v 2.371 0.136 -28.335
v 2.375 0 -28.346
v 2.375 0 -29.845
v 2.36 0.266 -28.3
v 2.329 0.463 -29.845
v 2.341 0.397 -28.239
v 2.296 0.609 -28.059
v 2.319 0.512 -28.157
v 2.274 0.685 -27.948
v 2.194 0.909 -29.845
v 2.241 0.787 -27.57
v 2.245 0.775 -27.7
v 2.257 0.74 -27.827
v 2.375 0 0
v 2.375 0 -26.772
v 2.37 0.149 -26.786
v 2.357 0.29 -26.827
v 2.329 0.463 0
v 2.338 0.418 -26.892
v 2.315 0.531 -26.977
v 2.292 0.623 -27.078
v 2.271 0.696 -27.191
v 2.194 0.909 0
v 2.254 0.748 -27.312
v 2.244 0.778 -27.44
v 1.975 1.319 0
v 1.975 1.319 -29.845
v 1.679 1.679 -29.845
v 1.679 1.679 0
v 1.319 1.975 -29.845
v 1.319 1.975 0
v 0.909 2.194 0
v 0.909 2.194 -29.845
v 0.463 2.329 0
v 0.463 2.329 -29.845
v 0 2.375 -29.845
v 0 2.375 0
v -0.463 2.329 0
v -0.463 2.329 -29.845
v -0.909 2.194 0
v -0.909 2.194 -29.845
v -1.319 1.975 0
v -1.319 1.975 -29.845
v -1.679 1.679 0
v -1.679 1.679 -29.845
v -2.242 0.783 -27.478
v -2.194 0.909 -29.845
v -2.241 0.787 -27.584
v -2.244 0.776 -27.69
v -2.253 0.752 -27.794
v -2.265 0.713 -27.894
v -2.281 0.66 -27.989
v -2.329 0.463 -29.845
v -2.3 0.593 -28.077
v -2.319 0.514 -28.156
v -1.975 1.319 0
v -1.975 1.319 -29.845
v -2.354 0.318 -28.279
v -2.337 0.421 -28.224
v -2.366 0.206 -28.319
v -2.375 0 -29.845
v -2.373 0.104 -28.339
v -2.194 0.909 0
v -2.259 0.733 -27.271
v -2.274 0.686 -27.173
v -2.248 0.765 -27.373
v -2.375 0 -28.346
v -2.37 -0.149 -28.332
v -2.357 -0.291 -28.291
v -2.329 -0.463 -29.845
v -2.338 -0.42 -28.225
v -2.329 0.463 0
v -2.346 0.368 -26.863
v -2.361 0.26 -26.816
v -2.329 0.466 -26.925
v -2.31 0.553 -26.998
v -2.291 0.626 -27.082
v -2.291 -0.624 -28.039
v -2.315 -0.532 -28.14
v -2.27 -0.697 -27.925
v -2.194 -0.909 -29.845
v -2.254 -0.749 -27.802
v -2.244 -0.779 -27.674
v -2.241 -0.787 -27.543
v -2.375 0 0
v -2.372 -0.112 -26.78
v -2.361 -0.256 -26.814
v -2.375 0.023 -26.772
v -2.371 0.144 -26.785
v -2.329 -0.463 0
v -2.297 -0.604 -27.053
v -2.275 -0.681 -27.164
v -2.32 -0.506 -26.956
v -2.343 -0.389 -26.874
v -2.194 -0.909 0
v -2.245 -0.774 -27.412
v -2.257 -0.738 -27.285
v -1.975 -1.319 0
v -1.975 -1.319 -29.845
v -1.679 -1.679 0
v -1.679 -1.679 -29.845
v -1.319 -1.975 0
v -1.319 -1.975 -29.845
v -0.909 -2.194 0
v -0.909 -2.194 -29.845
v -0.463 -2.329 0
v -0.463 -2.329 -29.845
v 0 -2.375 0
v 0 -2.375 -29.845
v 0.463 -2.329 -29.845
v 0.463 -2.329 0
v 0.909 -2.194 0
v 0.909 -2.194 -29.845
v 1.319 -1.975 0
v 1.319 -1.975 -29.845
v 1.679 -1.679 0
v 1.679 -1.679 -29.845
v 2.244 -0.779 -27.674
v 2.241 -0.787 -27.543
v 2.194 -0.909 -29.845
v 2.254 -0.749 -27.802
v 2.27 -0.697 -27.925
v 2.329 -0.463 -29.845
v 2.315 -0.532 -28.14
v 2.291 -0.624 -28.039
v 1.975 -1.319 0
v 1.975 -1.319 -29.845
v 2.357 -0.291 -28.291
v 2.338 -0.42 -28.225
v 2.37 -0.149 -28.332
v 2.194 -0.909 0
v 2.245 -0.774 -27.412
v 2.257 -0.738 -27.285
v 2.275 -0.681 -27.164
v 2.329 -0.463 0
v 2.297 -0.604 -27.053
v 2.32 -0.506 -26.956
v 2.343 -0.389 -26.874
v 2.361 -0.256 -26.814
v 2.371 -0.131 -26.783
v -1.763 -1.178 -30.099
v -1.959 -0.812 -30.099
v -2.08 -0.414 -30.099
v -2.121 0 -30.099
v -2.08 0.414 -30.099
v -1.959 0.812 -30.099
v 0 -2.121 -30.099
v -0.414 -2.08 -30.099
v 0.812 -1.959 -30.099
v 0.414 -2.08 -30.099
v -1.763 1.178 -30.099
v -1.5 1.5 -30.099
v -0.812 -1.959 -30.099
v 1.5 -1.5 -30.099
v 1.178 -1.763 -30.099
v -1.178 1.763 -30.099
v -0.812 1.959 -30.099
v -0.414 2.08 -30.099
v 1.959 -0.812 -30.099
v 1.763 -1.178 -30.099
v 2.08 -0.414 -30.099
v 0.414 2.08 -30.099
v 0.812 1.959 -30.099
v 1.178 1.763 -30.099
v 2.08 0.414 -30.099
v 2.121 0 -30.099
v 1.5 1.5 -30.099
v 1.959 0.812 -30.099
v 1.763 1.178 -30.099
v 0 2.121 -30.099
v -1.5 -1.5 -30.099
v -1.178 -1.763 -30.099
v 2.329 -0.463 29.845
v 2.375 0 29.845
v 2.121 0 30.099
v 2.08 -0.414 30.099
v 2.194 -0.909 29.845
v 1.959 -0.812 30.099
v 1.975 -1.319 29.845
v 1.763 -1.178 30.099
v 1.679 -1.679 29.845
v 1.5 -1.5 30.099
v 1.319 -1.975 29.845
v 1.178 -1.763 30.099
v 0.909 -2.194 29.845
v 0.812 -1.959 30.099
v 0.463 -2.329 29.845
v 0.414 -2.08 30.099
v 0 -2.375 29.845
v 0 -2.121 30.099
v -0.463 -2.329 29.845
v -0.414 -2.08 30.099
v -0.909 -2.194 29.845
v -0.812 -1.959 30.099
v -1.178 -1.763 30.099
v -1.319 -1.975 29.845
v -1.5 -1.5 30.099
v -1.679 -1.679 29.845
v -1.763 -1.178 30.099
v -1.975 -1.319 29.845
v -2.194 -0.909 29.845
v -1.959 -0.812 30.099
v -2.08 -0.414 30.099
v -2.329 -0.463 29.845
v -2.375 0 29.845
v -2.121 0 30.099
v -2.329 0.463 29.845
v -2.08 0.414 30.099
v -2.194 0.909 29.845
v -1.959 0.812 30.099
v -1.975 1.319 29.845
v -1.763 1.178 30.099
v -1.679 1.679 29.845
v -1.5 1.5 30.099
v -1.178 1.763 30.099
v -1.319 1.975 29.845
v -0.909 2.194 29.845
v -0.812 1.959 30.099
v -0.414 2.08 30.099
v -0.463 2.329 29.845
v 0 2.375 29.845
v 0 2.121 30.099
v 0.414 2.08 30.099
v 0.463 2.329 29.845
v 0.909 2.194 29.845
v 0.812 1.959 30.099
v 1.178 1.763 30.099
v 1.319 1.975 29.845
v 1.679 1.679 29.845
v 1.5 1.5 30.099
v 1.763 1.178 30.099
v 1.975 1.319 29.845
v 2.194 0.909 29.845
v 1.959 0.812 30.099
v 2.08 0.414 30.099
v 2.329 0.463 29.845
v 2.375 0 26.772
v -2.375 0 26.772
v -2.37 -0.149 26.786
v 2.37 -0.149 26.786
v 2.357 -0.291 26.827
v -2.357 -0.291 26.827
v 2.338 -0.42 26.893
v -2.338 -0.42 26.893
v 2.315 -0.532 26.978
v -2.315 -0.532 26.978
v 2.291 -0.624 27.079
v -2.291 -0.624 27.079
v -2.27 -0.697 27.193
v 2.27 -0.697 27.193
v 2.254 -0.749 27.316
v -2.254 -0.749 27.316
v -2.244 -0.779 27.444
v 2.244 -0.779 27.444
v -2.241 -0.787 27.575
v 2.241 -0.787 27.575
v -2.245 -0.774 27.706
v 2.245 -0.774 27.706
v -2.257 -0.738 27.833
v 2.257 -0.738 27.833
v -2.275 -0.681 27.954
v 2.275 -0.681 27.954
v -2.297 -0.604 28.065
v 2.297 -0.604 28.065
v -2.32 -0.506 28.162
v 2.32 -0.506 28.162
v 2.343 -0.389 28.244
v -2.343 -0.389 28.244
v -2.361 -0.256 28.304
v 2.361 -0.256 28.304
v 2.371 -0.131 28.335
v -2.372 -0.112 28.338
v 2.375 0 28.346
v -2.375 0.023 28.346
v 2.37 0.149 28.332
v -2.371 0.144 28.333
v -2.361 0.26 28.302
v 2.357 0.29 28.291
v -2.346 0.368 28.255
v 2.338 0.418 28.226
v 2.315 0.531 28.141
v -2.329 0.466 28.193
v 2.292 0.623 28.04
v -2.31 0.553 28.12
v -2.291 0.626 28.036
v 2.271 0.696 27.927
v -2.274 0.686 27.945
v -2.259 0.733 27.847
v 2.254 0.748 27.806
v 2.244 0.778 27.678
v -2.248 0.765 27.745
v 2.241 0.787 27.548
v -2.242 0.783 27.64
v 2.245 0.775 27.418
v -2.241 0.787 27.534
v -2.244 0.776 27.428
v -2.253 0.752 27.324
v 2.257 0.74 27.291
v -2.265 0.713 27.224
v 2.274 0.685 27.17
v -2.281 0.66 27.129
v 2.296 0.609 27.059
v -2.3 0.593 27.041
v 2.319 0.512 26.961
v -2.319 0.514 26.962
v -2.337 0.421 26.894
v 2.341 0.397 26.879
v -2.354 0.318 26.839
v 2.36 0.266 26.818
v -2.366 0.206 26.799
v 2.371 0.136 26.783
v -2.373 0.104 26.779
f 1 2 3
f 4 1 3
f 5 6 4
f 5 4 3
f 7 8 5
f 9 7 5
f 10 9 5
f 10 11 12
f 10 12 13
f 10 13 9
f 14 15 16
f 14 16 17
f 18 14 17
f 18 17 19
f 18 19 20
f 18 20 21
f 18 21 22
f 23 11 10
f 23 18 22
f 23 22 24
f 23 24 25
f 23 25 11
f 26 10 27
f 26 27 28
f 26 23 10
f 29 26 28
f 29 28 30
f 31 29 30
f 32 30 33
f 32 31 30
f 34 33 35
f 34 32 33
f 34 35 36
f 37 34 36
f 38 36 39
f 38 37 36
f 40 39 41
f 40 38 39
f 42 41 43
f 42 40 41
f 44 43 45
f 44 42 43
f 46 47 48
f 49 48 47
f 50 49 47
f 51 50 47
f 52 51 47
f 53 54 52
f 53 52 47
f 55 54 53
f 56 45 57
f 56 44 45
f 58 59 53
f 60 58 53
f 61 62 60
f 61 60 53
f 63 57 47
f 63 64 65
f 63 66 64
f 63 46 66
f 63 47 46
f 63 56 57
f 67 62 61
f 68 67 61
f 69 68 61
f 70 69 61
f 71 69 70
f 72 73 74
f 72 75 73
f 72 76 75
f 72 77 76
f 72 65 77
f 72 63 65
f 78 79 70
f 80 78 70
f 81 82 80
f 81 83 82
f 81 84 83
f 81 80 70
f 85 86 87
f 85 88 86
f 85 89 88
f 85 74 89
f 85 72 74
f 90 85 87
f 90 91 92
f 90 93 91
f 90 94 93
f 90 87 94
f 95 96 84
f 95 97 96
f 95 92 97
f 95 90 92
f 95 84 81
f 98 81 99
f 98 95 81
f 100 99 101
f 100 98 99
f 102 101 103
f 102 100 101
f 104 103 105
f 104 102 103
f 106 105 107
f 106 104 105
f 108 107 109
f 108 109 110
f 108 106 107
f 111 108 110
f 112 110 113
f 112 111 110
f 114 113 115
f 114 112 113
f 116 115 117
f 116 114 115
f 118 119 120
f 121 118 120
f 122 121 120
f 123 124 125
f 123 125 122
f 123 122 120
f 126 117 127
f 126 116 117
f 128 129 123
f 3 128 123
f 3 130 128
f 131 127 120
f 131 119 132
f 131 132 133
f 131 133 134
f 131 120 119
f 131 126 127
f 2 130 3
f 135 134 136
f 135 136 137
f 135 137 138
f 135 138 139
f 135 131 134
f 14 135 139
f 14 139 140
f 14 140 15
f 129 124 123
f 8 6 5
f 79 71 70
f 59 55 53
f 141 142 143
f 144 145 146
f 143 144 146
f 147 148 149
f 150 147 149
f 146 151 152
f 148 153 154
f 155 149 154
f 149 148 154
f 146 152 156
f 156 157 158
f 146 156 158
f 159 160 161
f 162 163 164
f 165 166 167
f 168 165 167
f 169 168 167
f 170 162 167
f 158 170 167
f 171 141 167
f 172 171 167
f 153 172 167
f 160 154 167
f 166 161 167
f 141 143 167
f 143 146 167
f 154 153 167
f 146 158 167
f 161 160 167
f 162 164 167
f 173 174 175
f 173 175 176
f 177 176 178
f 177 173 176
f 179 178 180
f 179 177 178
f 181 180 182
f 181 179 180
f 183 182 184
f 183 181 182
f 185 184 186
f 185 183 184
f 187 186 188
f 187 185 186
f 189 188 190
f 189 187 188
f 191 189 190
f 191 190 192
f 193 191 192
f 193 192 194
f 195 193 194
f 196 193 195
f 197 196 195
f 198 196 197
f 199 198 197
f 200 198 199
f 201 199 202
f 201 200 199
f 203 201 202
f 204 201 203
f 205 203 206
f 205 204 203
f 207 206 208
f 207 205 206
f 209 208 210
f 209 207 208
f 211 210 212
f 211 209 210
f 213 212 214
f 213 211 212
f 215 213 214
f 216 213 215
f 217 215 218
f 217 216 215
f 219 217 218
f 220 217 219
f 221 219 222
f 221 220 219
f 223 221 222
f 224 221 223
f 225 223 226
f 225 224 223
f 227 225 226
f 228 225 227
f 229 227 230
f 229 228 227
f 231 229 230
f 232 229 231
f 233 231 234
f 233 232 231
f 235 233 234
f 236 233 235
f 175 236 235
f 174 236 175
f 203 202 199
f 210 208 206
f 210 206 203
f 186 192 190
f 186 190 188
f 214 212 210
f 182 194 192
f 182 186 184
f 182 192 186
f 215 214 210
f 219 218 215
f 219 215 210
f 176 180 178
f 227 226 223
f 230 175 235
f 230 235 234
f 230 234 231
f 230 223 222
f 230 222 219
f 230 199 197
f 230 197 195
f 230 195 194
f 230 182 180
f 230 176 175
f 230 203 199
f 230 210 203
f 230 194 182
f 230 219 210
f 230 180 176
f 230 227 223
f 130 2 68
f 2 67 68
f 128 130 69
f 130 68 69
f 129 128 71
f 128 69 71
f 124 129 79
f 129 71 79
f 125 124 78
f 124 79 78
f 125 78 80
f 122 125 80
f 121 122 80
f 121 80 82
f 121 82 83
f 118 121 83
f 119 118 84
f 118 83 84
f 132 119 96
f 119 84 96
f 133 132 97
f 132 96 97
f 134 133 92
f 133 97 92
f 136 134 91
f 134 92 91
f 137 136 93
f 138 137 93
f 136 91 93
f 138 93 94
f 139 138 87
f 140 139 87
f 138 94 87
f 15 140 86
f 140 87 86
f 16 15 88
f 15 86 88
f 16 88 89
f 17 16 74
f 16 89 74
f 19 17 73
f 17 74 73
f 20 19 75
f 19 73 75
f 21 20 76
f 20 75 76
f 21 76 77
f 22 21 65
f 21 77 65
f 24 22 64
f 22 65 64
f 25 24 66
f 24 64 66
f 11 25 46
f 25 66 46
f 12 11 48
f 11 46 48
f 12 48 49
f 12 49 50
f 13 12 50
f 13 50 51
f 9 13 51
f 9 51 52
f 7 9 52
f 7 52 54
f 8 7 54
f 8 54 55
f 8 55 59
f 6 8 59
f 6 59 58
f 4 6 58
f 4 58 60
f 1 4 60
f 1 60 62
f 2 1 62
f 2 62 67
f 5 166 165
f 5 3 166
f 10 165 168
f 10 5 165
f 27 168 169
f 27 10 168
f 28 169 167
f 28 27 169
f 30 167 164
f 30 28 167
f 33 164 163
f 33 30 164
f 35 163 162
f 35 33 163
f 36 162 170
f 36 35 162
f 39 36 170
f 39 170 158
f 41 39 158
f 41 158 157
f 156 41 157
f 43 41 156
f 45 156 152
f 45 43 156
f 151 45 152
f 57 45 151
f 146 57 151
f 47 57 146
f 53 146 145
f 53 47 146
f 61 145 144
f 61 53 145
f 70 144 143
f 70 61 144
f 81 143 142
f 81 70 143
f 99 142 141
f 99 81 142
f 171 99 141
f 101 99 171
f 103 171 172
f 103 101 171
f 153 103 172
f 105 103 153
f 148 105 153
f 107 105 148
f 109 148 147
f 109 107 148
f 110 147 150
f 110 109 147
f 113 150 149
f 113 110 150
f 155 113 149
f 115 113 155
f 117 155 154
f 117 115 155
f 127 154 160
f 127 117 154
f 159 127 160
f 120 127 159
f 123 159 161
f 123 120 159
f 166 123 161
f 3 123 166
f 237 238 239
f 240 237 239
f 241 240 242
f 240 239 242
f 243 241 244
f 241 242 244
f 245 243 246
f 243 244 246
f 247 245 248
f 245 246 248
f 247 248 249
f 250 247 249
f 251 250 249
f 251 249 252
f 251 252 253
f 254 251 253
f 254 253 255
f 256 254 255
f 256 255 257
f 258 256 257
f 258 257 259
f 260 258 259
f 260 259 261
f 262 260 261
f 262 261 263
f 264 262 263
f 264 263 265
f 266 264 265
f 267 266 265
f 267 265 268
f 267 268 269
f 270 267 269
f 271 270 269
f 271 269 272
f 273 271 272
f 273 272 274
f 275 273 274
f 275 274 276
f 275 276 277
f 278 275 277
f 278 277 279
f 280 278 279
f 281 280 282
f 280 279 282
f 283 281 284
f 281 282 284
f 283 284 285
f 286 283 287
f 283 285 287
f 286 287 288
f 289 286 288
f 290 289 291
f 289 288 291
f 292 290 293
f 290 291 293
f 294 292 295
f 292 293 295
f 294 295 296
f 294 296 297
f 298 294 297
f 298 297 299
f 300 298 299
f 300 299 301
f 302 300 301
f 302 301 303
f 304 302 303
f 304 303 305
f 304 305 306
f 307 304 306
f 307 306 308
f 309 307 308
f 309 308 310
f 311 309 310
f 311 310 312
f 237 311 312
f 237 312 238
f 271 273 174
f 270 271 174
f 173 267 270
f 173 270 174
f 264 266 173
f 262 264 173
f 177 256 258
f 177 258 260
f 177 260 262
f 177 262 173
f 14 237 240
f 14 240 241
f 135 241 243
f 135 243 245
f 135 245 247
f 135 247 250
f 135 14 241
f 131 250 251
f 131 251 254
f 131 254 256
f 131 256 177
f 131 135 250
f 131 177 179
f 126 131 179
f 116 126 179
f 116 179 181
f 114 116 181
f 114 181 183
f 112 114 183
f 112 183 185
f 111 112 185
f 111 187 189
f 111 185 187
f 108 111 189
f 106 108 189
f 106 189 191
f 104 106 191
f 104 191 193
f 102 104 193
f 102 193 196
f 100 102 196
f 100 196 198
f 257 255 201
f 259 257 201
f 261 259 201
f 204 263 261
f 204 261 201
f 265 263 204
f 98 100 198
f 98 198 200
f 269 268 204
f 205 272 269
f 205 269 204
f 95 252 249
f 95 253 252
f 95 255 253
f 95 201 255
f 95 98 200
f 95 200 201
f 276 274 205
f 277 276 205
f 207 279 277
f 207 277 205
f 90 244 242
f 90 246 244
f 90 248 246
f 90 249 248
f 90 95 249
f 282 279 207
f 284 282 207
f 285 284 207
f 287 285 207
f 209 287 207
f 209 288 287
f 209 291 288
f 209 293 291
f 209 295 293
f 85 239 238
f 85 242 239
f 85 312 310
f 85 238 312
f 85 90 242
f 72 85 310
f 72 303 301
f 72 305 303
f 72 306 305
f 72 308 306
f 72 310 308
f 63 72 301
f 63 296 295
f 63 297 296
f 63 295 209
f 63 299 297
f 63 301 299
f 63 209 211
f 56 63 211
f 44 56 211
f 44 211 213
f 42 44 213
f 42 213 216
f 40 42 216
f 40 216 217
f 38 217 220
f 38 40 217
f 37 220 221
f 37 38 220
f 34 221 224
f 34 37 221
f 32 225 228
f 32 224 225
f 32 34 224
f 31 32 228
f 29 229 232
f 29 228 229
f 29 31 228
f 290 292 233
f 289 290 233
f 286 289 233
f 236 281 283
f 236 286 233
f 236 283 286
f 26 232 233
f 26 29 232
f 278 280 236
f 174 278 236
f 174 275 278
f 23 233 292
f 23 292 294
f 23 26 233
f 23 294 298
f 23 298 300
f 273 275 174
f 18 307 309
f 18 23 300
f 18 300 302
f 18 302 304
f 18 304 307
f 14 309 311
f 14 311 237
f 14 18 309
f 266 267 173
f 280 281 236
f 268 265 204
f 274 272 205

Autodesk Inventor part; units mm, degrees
ref_plane "Work Plane1" through (3.81, 0, 0) normal (1, 0, 0) x (0, 1, 0)
sketch "Sketch2" plane through (3.81, 0, 0) normal (1, 0, 0) x (0, 1, 0)
  line L0 (-38.5826, 0) -> (38.5826, 0) projected
  line L1 (0, 38.5826) -> (0, -38.5826) projected
  point P0 (0, 0)
  point P1 (0, 27.559)
  point P2 (0, -27.559)
  dimension "d6" = 55.118
  dimension "d7" = 27.559
sketch "Sketch1" plane through (0, 0, 0) normal (0, 0, 1) x (1, 0, 0)
  circle A0 centre (0, 0) radius 2.3749
  dimension "d0" = 4.7498
extrude "Extrusion1" add sketch "Sketch1" along normal mid plane 60.198
chamfer "Chamfer1" distance 0.254 angle 45 2 edges at (-2.3749, 0, 30.099) (-2.3749, 0, -30.099)
hole "Hole1" at (3.81, 0, 27.559) at (3.81, 0, -27.559) direction (-1, 0, 0) diameter 1.5748 end through all
equation "\"d7\" = 0.5 * d6"
properties part number "J005527" material "ALUMINUM, 6061-T651"
